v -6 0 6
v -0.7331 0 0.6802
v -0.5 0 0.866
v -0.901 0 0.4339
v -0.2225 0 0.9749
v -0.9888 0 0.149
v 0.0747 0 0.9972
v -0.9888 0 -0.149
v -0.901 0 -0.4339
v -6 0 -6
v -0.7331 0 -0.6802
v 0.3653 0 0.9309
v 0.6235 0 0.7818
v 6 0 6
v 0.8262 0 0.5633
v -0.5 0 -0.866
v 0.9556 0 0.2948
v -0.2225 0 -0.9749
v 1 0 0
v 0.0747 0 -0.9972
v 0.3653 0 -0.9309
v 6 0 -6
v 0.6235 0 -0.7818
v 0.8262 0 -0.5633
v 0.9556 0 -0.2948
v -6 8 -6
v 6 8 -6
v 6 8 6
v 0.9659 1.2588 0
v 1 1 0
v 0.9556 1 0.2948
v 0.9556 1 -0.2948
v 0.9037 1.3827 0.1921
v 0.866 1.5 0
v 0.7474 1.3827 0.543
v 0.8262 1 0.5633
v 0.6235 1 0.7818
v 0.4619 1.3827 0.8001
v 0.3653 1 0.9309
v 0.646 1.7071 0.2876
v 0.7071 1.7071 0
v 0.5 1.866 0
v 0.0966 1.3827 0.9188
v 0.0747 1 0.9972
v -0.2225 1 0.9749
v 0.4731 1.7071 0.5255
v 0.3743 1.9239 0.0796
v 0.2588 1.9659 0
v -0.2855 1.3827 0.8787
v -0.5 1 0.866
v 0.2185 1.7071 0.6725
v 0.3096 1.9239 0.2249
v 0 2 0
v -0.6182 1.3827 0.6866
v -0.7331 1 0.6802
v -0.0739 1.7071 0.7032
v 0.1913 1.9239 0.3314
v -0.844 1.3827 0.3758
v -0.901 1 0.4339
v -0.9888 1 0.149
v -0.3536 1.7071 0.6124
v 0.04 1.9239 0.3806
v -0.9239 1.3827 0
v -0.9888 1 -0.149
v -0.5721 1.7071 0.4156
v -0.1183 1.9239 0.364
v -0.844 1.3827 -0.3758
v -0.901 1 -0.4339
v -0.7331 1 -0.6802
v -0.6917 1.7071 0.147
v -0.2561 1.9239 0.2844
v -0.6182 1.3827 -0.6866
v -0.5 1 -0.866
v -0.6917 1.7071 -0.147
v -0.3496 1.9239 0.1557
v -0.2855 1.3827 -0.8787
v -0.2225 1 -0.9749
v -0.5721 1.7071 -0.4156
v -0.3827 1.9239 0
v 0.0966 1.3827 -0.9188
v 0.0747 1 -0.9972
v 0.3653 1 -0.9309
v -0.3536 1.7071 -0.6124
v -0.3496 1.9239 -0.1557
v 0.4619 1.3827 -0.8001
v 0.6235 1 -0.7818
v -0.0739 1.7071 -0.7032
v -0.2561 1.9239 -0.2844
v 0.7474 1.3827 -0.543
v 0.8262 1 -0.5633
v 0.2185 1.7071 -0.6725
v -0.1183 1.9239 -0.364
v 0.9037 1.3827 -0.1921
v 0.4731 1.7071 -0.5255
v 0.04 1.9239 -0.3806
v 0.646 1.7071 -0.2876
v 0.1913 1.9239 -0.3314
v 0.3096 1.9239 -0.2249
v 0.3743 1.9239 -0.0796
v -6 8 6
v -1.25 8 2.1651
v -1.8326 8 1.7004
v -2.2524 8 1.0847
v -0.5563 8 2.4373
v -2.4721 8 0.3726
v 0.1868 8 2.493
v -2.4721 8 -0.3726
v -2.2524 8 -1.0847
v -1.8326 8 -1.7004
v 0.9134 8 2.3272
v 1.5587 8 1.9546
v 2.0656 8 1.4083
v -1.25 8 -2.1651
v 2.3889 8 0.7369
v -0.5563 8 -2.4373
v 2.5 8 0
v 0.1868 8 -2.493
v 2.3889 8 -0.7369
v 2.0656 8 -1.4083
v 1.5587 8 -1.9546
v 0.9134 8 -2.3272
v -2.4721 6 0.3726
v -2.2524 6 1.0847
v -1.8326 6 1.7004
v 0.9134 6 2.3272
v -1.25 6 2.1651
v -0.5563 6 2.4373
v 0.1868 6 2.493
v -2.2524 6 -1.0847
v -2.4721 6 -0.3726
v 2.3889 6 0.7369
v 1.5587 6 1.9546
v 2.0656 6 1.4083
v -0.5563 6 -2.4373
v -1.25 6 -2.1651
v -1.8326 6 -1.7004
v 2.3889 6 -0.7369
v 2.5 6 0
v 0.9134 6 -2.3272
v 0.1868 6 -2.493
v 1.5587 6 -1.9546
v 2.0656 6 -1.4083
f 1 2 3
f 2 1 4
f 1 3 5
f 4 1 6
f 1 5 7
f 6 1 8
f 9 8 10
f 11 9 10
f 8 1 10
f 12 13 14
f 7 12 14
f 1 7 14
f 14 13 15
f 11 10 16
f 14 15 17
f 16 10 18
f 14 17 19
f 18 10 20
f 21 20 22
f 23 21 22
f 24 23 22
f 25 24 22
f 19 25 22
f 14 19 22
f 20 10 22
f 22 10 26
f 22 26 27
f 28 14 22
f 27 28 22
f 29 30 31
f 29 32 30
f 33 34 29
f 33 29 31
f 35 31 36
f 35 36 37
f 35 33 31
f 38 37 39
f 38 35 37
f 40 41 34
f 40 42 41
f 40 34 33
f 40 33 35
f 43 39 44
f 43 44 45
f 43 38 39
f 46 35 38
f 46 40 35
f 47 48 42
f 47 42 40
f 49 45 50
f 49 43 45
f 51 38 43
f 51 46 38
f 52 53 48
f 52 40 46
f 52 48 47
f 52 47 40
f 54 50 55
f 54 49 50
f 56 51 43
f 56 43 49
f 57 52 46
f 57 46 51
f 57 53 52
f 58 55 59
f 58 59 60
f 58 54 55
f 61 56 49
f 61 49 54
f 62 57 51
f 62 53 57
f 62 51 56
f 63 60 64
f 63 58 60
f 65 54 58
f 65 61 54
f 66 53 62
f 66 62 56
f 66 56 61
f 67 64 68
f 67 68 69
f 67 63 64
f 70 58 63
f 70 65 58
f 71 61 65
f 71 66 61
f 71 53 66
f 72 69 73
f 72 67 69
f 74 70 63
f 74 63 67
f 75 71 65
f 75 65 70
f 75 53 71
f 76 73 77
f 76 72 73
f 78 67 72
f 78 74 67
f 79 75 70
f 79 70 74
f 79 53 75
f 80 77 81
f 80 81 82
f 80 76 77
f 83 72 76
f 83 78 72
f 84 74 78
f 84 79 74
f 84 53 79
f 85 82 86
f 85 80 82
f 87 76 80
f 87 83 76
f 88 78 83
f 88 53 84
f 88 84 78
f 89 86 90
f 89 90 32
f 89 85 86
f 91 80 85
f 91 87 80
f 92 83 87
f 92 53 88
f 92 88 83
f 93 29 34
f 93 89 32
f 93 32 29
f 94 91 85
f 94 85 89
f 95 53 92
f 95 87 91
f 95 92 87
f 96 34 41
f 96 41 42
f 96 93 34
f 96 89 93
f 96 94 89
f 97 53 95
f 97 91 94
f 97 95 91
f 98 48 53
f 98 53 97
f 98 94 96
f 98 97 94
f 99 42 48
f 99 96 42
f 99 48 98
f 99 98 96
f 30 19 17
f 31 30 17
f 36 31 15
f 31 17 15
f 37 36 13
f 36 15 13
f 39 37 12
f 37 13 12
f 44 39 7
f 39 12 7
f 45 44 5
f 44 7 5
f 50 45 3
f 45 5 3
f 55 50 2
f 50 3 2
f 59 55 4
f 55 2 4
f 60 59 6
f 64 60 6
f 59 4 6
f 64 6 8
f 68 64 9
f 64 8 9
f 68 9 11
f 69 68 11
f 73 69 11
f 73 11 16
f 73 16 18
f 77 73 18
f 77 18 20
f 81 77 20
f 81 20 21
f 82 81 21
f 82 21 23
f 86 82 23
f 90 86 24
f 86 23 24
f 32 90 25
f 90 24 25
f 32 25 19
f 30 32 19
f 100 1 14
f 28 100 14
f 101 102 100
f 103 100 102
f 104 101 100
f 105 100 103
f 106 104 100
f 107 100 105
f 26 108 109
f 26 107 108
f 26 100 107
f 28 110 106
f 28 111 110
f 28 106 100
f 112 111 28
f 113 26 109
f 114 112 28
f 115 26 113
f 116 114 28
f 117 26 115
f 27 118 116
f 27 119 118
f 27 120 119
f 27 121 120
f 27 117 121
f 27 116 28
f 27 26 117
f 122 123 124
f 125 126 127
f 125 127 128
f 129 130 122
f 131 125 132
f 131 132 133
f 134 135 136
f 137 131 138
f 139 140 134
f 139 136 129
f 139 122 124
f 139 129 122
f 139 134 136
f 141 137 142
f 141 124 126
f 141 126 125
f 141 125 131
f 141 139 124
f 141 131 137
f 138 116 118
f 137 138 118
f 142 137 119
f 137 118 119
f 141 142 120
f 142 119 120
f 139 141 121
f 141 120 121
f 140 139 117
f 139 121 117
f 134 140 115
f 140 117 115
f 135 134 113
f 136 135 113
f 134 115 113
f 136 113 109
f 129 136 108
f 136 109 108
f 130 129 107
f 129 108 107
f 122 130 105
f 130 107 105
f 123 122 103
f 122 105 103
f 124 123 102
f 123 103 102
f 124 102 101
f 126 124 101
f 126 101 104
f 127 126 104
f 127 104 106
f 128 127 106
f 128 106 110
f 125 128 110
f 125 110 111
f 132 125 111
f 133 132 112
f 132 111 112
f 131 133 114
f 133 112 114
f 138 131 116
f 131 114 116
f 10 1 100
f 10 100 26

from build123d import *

# Parameters (mm, degrees)
SKETCH1_W           = 12
SKETCH1_H           = 12
BOSS_EXTRUDE1_DEPTH = 8
SKETCH2_R           = 2.5
CUT_EXTRUDE1_DEPTH  = 2
SKETCH3_R           = 1
CUT_EXTRUDE2_DEPTH  = 2
FILLET1_R           = 1


with BuildPart() as part:
    # Sketch1 → Boss-Extrude1 (new body)
    with BuildSketch(Plane(origin=(0, 0, 0), x_dir=(1, 0, 0), z_dir=(0, 1, 0))):
        Rectangle(SKETCH1_W, SKETCH1_H)
    extrude(amount=BOSS_EXTRUDE1_DEPTH)

    # Sketch2 → Cut-Extrude1 (cut)
    with BuildSketch(Plane(origin=(0, 8, 0), x_dir=(1, 0, 0), z_dir=(0, 1, 0))):
        Circle(SKETCH2_R)
    extrude(amount=-CUT_EXTRUDE1_DEPTH, mode=Mode.SUBTRACT)

    # Sketch3 → Cut-Extrude2 (cut)
    with BuildSketch(Plane.XZ):
        Circle(SKETCH3_R)
    extrude(amount=-CUT_EXTRUDE2_DEPTH, mode=Mode.SUBTRACT)

    # Fillet1
    fillet1_edges = [part.edges().sort_by_distance(p)[0] for p in [
        (-1, 2, 0),
    ]]
    fillet(fillet1_edges, radius=FILLET1_R)


solid = part.part
